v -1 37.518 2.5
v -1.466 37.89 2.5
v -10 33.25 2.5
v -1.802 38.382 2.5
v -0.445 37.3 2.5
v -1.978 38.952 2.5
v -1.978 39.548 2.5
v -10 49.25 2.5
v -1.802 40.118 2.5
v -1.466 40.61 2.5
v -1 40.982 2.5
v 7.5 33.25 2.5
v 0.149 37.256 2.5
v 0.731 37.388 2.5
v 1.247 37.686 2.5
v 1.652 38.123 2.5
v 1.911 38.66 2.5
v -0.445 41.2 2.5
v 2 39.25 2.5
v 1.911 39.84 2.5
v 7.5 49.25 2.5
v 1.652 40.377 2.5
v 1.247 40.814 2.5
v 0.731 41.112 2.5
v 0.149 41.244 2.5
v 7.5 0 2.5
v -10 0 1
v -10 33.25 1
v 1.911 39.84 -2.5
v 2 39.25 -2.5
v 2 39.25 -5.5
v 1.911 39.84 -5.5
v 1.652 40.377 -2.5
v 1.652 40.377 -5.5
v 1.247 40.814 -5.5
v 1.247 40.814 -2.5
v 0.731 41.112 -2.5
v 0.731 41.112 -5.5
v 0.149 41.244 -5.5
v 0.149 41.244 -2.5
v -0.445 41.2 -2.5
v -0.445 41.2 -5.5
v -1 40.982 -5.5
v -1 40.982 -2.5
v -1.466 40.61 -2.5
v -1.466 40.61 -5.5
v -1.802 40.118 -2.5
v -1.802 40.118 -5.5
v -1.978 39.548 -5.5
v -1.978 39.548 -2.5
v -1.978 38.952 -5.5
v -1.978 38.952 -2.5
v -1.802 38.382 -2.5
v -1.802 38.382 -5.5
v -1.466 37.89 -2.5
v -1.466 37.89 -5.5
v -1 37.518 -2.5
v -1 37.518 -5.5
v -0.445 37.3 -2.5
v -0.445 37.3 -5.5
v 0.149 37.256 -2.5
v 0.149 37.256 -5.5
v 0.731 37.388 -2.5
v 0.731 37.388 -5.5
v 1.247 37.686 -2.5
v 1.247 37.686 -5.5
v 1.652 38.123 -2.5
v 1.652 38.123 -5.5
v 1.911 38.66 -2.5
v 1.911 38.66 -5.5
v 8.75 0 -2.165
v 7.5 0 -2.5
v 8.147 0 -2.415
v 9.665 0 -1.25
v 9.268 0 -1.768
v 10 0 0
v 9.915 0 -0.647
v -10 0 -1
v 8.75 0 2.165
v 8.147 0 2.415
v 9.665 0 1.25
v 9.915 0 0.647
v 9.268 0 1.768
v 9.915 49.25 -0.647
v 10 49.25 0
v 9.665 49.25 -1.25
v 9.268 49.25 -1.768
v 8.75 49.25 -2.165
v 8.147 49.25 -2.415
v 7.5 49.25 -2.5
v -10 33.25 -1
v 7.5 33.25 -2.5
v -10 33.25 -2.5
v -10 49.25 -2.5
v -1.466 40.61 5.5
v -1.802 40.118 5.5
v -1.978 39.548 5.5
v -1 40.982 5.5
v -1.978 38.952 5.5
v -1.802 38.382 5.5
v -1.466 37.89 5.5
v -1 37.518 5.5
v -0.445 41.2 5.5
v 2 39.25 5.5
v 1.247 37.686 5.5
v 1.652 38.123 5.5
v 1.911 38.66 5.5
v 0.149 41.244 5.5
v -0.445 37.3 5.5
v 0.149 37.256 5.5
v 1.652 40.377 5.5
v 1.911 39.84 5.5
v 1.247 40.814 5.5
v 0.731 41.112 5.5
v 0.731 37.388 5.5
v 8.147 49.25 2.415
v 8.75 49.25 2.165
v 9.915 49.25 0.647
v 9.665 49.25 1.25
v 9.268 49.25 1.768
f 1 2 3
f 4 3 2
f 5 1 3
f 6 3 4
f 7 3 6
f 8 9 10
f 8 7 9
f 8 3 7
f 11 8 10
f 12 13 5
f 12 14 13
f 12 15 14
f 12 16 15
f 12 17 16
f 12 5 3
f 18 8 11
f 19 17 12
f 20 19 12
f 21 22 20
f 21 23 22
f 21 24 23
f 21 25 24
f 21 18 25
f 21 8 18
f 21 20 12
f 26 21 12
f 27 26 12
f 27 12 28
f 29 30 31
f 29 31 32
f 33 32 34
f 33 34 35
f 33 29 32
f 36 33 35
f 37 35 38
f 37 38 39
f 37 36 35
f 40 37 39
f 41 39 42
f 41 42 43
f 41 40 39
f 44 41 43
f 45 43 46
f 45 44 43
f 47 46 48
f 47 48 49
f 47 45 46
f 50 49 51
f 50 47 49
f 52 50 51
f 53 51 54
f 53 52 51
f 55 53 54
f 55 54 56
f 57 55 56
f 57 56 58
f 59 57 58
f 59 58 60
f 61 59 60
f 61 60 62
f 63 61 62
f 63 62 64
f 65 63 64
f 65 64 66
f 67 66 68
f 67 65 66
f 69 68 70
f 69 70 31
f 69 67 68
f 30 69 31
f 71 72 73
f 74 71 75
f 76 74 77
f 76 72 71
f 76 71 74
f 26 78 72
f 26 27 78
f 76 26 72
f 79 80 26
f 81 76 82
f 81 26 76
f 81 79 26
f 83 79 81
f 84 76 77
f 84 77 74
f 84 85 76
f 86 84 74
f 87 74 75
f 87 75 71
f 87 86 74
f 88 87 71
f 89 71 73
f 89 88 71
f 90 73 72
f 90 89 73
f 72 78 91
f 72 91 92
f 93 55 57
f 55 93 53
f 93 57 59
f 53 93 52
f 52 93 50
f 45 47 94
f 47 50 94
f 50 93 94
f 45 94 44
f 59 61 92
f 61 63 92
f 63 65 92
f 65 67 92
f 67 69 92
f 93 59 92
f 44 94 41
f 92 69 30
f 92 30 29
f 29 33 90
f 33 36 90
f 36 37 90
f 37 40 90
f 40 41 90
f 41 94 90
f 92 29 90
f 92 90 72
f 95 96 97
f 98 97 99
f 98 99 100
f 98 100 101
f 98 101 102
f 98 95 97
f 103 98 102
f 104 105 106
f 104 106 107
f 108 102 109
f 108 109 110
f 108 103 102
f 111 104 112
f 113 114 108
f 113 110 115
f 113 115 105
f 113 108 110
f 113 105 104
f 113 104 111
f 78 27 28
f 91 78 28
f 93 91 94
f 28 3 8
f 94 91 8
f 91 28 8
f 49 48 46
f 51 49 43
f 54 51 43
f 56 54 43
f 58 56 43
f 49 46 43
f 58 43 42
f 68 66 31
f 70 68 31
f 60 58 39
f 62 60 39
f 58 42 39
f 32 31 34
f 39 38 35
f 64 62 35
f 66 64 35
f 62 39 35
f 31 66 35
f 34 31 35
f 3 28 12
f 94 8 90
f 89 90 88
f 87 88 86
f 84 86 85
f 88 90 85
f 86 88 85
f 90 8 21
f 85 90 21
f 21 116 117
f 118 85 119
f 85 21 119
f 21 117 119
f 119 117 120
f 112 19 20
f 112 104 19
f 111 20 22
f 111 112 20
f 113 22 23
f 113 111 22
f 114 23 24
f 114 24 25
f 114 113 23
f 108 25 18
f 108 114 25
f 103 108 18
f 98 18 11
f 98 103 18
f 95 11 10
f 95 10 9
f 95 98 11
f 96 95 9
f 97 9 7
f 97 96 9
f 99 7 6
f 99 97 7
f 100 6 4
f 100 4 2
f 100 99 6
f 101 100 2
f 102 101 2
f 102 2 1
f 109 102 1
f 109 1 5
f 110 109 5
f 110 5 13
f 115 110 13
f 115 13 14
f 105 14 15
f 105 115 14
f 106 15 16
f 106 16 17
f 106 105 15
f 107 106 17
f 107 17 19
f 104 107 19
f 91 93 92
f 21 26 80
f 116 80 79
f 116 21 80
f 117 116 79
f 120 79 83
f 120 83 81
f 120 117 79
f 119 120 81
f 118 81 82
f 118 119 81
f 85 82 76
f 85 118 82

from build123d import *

# Parameters (mm, degrees)
SKETCH1_W           = 20
SKETCH1_H           = 49.25
BOSS_EXTRUDE1_DEPTH = 2.5
FILLET3_R           = 2.5
CUT_EXTRUDE1_START  = -16
CUT_EXTRUDE1_DEPTH  = 35.317119353
SKETCH14_R          = 2
BOSS_EXTRUDE2_DEPTH = 5.5


with BuildPart() as part:
    # Sketch1 → Boss-Extrude1 (new, symmetric)
    with BuildSketch(Plane.XY):
        with Locations((0, 24.625)):
            Rectangle(SKETCH1_W, SKETCH1_H)
    extrude(amount=BOSS_EXTRUDE1_DEPTH, both=True)

    # Fillet3
    fillet3_edges = [part.edges().sort_by_distance(p)[0] for p in [
        (10, 24.625, 2.5),
        (10, 24.625, -2.5),
    ]]
    fillet(fillet3_edges, radius=FILLET3_R - 0.0001)  # a hair under: the kernel refuses the full size

    # Sketch11 → Cut-Extrude1 (cut, through all)
    with BuildSketch(Plane(origin=(0, 49.25, 0), x_dir=(1, 0, 0), z_dir=(0, 1, 0)).offset(CUT_EXTRUDE1_START)):
        Polygon((-10, 1), (7.5, 2.5), (-10, 2.5), align=None)
        Polygon((7.5, -2.5), (-10, -1), (-10, -2.5), align=None)
    extrude(amount=-CUT_EXTRUDE1_DEPTH, mode=Mode.SUBTRACT)

    # Sketch14 → Boss-Extrude2 (add, symmetric)
    with BuildSketch(Plane.XY):
        with Locations((0, 39.25)):
            Circle(SKETCH14_R)
    extrude(amount=BOSS_EXTRUDE2_DEPTH, both=True)


solid = part.part
